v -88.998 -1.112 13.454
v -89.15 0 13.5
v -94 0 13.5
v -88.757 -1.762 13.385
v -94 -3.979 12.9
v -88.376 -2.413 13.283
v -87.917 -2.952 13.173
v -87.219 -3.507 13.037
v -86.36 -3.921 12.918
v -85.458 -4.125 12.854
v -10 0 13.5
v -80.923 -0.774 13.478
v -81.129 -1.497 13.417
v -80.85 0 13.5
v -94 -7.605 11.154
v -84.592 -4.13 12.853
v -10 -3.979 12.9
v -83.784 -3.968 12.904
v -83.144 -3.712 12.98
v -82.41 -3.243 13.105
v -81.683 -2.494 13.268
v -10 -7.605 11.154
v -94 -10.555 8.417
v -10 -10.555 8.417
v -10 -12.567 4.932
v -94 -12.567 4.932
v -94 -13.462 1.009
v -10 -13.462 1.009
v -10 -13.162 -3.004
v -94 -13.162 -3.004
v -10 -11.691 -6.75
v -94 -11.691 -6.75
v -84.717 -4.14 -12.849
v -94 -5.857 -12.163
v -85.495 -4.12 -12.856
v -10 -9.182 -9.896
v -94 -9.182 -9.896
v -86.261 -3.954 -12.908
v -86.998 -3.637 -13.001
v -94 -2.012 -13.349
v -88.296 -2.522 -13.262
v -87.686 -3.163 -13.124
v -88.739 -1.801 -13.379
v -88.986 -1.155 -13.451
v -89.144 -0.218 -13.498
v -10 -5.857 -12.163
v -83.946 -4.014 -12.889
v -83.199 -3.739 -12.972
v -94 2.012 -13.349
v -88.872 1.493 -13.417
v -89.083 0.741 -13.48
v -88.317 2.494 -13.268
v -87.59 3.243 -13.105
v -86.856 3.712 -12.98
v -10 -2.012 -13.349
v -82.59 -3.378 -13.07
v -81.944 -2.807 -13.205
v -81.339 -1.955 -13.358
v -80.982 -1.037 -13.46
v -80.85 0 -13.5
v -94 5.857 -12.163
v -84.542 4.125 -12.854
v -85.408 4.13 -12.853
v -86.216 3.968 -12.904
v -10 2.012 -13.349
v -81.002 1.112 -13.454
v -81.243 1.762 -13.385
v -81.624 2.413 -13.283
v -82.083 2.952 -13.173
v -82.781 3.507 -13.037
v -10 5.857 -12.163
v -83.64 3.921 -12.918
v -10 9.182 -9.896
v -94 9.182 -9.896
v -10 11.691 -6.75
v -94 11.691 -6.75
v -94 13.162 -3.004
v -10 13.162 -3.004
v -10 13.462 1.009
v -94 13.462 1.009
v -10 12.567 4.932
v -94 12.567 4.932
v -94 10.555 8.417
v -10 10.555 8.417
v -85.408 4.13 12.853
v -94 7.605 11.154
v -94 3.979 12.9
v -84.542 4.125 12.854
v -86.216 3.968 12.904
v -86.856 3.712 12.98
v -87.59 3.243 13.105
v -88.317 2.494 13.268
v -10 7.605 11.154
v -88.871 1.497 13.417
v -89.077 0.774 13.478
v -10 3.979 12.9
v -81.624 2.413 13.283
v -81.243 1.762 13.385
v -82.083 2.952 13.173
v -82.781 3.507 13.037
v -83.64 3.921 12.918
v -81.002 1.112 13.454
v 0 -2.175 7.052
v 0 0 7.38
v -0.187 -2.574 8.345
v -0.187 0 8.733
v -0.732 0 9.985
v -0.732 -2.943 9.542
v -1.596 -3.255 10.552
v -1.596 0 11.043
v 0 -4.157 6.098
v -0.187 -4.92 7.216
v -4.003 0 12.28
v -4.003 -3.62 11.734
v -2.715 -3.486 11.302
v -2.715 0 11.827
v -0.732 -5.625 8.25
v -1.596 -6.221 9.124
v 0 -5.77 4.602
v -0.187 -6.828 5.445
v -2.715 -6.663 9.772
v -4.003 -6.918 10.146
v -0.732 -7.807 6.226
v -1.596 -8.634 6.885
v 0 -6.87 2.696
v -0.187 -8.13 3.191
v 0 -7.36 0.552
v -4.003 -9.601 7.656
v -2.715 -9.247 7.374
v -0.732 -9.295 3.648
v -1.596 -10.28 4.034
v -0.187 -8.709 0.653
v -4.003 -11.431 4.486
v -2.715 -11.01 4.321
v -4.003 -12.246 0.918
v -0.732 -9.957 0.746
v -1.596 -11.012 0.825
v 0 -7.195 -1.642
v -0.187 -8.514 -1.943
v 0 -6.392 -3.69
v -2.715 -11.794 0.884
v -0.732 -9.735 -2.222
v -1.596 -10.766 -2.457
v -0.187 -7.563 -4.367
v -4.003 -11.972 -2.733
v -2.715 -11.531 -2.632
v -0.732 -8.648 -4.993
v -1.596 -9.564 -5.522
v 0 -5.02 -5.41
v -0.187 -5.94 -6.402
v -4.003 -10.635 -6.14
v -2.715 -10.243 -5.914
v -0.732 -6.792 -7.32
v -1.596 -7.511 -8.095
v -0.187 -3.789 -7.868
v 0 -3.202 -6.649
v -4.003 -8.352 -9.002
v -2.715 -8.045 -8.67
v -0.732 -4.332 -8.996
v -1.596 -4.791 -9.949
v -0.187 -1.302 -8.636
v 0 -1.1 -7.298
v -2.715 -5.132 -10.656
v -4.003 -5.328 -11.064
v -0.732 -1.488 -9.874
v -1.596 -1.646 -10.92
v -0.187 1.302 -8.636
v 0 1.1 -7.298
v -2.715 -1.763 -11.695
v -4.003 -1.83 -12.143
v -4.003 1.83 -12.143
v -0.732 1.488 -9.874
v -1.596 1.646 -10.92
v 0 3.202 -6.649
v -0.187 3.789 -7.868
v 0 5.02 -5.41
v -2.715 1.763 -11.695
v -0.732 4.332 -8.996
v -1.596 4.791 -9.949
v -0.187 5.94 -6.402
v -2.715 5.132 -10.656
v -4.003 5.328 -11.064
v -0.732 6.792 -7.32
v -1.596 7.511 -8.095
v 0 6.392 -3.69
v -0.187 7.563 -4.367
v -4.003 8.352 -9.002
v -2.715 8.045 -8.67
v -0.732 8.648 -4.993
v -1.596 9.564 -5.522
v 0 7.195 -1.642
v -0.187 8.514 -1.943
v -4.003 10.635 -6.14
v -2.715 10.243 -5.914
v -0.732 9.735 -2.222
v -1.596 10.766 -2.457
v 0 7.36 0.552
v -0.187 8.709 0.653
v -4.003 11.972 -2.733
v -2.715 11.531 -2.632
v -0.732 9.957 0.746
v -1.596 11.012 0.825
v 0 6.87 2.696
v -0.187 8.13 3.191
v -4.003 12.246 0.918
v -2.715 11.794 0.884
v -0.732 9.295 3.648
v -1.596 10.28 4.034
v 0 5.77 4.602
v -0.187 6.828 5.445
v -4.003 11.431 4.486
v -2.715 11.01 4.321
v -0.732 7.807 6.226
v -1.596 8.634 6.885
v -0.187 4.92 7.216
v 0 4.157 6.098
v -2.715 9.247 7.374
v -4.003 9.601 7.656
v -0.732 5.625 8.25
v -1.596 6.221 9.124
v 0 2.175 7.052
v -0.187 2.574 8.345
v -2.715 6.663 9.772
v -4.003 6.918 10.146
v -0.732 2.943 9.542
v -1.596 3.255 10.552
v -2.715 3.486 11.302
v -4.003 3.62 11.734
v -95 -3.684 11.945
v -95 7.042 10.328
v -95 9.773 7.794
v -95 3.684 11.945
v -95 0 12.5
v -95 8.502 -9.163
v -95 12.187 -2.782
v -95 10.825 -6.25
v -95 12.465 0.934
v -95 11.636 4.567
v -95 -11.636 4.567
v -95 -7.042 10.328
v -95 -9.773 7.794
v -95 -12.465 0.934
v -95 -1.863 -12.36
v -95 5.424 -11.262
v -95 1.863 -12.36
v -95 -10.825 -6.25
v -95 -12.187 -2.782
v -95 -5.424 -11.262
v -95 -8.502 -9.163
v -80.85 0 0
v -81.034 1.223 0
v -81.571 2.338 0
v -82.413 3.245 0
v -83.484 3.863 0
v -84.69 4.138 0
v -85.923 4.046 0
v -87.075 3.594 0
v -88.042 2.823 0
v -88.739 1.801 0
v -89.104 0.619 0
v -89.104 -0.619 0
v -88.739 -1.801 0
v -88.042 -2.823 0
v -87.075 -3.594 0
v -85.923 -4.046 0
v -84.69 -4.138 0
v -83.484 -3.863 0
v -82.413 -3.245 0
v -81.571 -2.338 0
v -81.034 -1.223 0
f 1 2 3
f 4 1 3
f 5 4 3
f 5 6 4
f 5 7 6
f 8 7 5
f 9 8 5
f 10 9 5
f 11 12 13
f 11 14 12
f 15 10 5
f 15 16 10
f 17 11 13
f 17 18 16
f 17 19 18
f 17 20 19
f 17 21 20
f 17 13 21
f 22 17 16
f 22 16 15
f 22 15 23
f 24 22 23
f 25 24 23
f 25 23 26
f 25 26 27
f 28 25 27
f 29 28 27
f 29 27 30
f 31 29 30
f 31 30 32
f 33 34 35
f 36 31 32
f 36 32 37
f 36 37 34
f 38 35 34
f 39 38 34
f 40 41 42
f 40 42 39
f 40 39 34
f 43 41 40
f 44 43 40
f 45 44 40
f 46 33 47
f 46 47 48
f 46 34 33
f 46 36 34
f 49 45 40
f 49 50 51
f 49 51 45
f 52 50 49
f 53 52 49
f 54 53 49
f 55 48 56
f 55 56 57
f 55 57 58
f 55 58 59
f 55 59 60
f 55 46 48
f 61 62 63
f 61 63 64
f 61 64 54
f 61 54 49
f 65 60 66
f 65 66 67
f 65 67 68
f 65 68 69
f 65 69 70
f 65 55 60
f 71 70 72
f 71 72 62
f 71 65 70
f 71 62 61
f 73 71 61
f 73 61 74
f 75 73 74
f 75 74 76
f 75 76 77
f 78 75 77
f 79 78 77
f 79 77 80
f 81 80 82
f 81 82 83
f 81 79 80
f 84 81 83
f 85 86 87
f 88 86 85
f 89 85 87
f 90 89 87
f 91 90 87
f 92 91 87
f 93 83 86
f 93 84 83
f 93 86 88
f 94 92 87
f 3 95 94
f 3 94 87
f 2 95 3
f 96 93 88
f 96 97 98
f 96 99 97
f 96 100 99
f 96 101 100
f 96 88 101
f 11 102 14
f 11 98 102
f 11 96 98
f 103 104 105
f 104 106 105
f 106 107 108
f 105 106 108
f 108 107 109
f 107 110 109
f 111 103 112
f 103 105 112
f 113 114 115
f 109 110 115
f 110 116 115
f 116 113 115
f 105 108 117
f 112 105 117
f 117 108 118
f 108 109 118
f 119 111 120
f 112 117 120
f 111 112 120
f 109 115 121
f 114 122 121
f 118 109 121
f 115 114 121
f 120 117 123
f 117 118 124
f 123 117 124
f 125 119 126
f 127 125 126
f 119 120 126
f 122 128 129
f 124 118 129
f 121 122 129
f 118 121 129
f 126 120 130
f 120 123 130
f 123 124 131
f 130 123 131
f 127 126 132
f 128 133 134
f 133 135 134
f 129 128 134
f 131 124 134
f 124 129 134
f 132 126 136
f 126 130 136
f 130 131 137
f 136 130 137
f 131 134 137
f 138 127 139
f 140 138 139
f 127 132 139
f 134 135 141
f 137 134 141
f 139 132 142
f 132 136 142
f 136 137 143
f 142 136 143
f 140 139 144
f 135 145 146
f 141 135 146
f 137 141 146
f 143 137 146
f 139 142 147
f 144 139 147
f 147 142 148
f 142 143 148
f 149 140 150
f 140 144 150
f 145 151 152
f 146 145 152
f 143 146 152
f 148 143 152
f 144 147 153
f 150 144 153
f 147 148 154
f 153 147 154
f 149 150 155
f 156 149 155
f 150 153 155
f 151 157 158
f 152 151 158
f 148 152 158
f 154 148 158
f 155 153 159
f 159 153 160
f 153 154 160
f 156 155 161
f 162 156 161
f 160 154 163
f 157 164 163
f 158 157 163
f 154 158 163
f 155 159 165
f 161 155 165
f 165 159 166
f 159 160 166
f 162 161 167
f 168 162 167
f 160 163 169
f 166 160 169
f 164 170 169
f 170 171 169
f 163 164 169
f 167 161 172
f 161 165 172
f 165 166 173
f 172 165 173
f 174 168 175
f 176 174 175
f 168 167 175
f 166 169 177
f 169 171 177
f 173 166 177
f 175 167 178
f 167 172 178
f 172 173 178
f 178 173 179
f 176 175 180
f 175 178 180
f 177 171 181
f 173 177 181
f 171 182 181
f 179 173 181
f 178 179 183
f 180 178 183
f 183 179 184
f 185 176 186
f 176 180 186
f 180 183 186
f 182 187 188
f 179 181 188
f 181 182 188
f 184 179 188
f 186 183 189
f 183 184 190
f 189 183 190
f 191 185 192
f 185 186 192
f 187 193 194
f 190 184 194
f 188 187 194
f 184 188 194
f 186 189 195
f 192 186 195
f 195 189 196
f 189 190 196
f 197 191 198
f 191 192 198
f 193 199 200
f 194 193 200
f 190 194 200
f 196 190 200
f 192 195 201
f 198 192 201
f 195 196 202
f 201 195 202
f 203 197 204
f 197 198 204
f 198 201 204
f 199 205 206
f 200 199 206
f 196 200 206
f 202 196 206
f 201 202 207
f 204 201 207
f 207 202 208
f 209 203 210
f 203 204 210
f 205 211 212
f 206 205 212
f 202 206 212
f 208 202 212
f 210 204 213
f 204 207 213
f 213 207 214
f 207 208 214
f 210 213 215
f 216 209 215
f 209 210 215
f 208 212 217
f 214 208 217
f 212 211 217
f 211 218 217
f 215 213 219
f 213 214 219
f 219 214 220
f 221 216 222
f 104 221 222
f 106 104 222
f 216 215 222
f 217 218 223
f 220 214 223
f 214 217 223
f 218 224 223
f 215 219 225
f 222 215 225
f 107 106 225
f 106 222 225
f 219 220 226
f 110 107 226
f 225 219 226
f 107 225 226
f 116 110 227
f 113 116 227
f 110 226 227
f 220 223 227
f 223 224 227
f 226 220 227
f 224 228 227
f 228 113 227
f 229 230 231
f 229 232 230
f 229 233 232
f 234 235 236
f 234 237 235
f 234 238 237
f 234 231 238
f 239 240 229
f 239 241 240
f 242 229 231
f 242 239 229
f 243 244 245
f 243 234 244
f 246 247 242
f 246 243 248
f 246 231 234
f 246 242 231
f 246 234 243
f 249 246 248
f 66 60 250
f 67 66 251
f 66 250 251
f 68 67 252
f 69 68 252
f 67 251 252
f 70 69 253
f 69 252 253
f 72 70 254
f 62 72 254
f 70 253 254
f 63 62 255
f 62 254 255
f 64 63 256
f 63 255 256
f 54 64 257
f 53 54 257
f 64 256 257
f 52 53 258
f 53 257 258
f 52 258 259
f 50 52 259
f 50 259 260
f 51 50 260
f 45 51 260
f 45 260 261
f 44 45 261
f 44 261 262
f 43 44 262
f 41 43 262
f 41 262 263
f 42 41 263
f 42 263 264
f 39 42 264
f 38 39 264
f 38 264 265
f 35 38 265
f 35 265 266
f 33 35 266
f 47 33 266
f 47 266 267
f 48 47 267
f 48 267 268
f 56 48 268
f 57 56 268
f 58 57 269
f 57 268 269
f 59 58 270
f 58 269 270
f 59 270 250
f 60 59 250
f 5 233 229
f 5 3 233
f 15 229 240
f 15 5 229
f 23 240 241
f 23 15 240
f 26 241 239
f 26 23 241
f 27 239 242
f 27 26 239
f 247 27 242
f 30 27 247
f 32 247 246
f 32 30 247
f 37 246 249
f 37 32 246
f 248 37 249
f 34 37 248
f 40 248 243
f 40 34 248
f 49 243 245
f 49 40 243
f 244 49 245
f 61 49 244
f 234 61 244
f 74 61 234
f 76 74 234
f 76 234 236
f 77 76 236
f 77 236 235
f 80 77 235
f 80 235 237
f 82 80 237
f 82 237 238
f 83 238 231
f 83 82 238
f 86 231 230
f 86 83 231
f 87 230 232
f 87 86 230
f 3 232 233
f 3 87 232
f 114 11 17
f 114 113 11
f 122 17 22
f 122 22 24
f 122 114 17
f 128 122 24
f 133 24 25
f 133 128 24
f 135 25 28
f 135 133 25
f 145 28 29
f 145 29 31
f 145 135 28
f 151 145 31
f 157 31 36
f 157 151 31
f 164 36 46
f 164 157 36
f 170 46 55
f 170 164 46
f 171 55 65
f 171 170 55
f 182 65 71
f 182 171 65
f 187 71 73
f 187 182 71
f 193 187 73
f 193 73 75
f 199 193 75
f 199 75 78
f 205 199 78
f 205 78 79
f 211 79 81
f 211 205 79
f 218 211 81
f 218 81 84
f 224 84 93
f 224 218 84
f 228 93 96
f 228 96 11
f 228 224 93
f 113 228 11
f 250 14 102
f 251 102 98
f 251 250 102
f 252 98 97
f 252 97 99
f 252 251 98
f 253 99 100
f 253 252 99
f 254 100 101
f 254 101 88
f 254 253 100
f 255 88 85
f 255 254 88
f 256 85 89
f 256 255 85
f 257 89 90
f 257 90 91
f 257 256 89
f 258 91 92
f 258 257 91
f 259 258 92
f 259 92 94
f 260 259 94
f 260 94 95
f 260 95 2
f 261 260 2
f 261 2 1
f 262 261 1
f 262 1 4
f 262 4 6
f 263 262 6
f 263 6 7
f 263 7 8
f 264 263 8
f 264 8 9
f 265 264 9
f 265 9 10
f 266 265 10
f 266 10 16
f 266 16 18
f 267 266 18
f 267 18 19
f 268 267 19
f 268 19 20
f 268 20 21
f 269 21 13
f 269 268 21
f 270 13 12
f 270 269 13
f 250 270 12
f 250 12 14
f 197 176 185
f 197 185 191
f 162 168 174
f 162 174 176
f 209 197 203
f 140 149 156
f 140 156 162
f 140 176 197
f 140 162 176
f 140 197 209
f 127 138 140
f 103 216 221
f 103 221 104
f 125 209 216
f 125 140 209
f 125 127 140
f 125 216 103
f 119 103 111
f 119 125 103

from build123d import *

# Parameters (mm, degrees)
SKETCH001_R       = 4.15
POCKET_DEPTH      = 13.501
POCKET_DEPTH_BACK = -13.501


with BuildPart() as part:
    # Sketch → Revolution (revolve)
    with BuildSketch(Plane.XZ):
        with BuildLine():
            Line((-95, 0), (-95, 12.5))
            Line((-95, 12.5), (-94, 13.5))
            Line((-94, 13.5), (-10, 13.5))
            Line((-10, 13.5), (-4.00316, 12.279929))
            ThreePointArc((0, 7.380306), (-1.128037, 10.543832), (-4.00316, 12.279929))
            Line((0, 7.380306), (0, 0))
            Line((0, 0), (-95, 0))
        make_face()
    revolve(axis=Axis((0, 0, 0), (1, 0, 0)))

    # Sketch001 → Pocket (cut, two sides)
    with BuildSketch(Plane.XY) as pocket_sk:
        with Locations((-85, 0)):
            Circle(SKETCH001_R)
    extrude(amount=-POCKET_DEPTH, mode=Mode.SUBTRACT)
    extrude(pocket_sk.sketch, amount=-POCKET_DEPTH_BACK, mode=Mode.SUBTRACT)


solid = part.part
